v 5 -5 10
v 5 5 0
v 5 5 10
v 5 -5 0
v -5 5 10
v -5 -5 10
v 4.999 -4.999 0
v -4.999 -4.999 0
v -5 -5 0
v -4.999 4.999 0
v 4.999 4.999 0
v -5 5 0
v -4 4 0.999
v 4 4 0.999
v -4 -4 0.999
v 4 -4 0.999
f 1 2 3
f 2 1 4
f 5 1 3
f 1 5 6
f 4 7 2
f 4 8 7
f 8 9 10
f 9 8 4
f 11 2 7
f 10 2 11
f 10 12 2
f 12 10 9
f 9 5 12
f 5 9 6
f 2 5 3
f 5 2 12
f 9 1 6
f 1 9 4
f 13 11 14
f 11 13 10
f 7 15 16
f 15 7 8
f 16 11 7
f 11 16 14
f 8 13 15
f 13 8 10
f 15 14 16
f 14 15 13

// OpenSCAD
*difference() {
    n_edged_block([3+$t*10, 5, 5]);
    translate([0, 0, 1]) n_edged_block([3+$t*10, 4, 5]);
}
//elongated_cylinder([1, 1, 4]);
difference() {
    solid_block_chamferred([10, 10, 10], 5*$t);
    translate([0, 0, -0.001]) inner_chamferring([10-(5*$t + 1)*2, 10-(5*$t + 1)*2], 1);
}
//inner_chamferring([-1, -1], 1);

//dimensions = [number of edges, distance from corner to center, height]
module n_edged_block(dimensions) {
    n = dimensions[0];
    r = dimensions[1];
    height = dimensions[2];
    angles = [ for (i = [0:n-1]) i*(360/n) ];
    coords = [ for (th=angles) [r*cos(th), r*sin(th)] ];
    linear_extrude(height, convexity = 10)
        polygon(coords);
}

//dimensions = [lower diameter, upper diameter, height]
module solid_cylinder(dimensions) {
    translate([0, 0, dimensions[2]/2])
        cylinder(dimensions[2], d1= dimensions[0], d2 = dimensions[1], center = true, $fn = 100);
}

//dimensions = [diameter of cylinder, elongation from center, height]
module elongated_cylinder(dimensions) {
    radius = dimensions[0]/2;
    for (i = [-1 : 2 : 1]) translate([i * dimensions[1]/2, 0, 0])
        cylinder(dimensions[2], radius, radius, $fn=100);
    #solid_block([dimensions[1], dimensions[0], dimensions[2]]);
}

//dimensions = [width(x), length(y), height(z)]
module solid_block(dimensions) {
    translate([0, 0, dimensions[2]/2])
        cube(dimensions, true);
}

//dimensions = [width(x), length(y), height(z)]
//chamferWidth = width of cut on bottom corners
module solid_block_chamferred(dimensions, chamferWidth = 0) {
    difference() {
        solid_block(dimensions);
        for (i = [0 : 1]) {
            translate([(i%2)*(dimensions[0]-chamferWidth)/2, (1-i%2)*(dimensions[1]-chamferWidth)/2, chamferWidth/2])
            rotate([-135*(1-i%2), 135*(i%2), 0])
                solid_block(
                            [(1-i%2)*dimensions[0] + (i%2)*chamferWidth*2, 
                             (i%2)*dimensions[1] + (1-i%2)*chamferWidth*2, 
                             chamferWidth]);
            translate([-(i%2)*(dimensions[0]-chamferWidth)/2, -(1-i%2)*(dimensions[1]-chamferWidth)/2, chamferWidth/2])
            rotate([135*(1-i%2), -135*(i%2), 0])
                solid_block(
                            [(1-i%2)*dimensions[0] + (i%2)*chamferWidth*2, 
                             (i%2)*dimensions[1] + (1-i%2)*chamferWidth*2, 
                             chamferWidth]);
        }
    }
}

//mainly used for subtration
//dimensions = [width(x), length(y)]
//chamferWidth = height and extra width that is meant to be subtracted
module inner_chamferring(dimensions, chamferWidth = 0) {
    dimensions = [dimensions[0]+chamferWidth*2, dimensions[1]+chamferWidth*2, chamferWidth];
    difference() {
        solid_block(dimensions);
        for (i = [0 : 1]) {
            translate([(i%2)*(dimensions[0]-chamferWidth)/2, (1-i%2)*(dimensions[1]-chamferWidth)/2, chamferWidth/2])
            rotate([-45*(1-i%2), 45*(i%2), 0])
                solid_block(
                            [(1-i%2)*dimensions[0] + (i%2)*chamferWidth*2, 
                             (i%2)*dimensions[1] + (1-i%2)*chamferWidth*2, 
                             chamferWidth]);
            translate([-(i%2)*(dimensions[0]-chamferWidth)/2, -(1-i%2)*(dimensions[1]-chamferWidth)/2, chamferWidth/2])
            rotate([45*(1-i%2), -45*(i%2), 0])
                solid_block(
                            [(1-i%2)*dimensions[0] + (i%2)*chamferWidth*2, 
                             (i%2)*dimensions[1] + (1-i%2)*chamferWidth*2, 
                             chamferWidth]);
        }
    }
}

//for bigger modules, copy and paste and replace __format__ with the name of the module you are creating
module _format_(shift = [0, 0, 0], rotation = [0, 0, 0]) {
    translate(shift) { rotate(rotation) {
    
    
    
    
    
    }}
}


//for wire path
module wire_path(start, end, width, height){
    vector = [end[0] - start[0], end[1] - start[1]];
    angle = atan(vector[1] / vector[0]) + 90 * ((vector[0] / abs(vector[0]) - 1));
    length = sqrt(pow(vector[0], 2)) + pow(vector[1], 2);
    
    
    
    
    translate(start) rotate([0, 0, angle])
        translate([length/2, 0, -height/2])
            solid_block([length, width, height]);
    
    }
